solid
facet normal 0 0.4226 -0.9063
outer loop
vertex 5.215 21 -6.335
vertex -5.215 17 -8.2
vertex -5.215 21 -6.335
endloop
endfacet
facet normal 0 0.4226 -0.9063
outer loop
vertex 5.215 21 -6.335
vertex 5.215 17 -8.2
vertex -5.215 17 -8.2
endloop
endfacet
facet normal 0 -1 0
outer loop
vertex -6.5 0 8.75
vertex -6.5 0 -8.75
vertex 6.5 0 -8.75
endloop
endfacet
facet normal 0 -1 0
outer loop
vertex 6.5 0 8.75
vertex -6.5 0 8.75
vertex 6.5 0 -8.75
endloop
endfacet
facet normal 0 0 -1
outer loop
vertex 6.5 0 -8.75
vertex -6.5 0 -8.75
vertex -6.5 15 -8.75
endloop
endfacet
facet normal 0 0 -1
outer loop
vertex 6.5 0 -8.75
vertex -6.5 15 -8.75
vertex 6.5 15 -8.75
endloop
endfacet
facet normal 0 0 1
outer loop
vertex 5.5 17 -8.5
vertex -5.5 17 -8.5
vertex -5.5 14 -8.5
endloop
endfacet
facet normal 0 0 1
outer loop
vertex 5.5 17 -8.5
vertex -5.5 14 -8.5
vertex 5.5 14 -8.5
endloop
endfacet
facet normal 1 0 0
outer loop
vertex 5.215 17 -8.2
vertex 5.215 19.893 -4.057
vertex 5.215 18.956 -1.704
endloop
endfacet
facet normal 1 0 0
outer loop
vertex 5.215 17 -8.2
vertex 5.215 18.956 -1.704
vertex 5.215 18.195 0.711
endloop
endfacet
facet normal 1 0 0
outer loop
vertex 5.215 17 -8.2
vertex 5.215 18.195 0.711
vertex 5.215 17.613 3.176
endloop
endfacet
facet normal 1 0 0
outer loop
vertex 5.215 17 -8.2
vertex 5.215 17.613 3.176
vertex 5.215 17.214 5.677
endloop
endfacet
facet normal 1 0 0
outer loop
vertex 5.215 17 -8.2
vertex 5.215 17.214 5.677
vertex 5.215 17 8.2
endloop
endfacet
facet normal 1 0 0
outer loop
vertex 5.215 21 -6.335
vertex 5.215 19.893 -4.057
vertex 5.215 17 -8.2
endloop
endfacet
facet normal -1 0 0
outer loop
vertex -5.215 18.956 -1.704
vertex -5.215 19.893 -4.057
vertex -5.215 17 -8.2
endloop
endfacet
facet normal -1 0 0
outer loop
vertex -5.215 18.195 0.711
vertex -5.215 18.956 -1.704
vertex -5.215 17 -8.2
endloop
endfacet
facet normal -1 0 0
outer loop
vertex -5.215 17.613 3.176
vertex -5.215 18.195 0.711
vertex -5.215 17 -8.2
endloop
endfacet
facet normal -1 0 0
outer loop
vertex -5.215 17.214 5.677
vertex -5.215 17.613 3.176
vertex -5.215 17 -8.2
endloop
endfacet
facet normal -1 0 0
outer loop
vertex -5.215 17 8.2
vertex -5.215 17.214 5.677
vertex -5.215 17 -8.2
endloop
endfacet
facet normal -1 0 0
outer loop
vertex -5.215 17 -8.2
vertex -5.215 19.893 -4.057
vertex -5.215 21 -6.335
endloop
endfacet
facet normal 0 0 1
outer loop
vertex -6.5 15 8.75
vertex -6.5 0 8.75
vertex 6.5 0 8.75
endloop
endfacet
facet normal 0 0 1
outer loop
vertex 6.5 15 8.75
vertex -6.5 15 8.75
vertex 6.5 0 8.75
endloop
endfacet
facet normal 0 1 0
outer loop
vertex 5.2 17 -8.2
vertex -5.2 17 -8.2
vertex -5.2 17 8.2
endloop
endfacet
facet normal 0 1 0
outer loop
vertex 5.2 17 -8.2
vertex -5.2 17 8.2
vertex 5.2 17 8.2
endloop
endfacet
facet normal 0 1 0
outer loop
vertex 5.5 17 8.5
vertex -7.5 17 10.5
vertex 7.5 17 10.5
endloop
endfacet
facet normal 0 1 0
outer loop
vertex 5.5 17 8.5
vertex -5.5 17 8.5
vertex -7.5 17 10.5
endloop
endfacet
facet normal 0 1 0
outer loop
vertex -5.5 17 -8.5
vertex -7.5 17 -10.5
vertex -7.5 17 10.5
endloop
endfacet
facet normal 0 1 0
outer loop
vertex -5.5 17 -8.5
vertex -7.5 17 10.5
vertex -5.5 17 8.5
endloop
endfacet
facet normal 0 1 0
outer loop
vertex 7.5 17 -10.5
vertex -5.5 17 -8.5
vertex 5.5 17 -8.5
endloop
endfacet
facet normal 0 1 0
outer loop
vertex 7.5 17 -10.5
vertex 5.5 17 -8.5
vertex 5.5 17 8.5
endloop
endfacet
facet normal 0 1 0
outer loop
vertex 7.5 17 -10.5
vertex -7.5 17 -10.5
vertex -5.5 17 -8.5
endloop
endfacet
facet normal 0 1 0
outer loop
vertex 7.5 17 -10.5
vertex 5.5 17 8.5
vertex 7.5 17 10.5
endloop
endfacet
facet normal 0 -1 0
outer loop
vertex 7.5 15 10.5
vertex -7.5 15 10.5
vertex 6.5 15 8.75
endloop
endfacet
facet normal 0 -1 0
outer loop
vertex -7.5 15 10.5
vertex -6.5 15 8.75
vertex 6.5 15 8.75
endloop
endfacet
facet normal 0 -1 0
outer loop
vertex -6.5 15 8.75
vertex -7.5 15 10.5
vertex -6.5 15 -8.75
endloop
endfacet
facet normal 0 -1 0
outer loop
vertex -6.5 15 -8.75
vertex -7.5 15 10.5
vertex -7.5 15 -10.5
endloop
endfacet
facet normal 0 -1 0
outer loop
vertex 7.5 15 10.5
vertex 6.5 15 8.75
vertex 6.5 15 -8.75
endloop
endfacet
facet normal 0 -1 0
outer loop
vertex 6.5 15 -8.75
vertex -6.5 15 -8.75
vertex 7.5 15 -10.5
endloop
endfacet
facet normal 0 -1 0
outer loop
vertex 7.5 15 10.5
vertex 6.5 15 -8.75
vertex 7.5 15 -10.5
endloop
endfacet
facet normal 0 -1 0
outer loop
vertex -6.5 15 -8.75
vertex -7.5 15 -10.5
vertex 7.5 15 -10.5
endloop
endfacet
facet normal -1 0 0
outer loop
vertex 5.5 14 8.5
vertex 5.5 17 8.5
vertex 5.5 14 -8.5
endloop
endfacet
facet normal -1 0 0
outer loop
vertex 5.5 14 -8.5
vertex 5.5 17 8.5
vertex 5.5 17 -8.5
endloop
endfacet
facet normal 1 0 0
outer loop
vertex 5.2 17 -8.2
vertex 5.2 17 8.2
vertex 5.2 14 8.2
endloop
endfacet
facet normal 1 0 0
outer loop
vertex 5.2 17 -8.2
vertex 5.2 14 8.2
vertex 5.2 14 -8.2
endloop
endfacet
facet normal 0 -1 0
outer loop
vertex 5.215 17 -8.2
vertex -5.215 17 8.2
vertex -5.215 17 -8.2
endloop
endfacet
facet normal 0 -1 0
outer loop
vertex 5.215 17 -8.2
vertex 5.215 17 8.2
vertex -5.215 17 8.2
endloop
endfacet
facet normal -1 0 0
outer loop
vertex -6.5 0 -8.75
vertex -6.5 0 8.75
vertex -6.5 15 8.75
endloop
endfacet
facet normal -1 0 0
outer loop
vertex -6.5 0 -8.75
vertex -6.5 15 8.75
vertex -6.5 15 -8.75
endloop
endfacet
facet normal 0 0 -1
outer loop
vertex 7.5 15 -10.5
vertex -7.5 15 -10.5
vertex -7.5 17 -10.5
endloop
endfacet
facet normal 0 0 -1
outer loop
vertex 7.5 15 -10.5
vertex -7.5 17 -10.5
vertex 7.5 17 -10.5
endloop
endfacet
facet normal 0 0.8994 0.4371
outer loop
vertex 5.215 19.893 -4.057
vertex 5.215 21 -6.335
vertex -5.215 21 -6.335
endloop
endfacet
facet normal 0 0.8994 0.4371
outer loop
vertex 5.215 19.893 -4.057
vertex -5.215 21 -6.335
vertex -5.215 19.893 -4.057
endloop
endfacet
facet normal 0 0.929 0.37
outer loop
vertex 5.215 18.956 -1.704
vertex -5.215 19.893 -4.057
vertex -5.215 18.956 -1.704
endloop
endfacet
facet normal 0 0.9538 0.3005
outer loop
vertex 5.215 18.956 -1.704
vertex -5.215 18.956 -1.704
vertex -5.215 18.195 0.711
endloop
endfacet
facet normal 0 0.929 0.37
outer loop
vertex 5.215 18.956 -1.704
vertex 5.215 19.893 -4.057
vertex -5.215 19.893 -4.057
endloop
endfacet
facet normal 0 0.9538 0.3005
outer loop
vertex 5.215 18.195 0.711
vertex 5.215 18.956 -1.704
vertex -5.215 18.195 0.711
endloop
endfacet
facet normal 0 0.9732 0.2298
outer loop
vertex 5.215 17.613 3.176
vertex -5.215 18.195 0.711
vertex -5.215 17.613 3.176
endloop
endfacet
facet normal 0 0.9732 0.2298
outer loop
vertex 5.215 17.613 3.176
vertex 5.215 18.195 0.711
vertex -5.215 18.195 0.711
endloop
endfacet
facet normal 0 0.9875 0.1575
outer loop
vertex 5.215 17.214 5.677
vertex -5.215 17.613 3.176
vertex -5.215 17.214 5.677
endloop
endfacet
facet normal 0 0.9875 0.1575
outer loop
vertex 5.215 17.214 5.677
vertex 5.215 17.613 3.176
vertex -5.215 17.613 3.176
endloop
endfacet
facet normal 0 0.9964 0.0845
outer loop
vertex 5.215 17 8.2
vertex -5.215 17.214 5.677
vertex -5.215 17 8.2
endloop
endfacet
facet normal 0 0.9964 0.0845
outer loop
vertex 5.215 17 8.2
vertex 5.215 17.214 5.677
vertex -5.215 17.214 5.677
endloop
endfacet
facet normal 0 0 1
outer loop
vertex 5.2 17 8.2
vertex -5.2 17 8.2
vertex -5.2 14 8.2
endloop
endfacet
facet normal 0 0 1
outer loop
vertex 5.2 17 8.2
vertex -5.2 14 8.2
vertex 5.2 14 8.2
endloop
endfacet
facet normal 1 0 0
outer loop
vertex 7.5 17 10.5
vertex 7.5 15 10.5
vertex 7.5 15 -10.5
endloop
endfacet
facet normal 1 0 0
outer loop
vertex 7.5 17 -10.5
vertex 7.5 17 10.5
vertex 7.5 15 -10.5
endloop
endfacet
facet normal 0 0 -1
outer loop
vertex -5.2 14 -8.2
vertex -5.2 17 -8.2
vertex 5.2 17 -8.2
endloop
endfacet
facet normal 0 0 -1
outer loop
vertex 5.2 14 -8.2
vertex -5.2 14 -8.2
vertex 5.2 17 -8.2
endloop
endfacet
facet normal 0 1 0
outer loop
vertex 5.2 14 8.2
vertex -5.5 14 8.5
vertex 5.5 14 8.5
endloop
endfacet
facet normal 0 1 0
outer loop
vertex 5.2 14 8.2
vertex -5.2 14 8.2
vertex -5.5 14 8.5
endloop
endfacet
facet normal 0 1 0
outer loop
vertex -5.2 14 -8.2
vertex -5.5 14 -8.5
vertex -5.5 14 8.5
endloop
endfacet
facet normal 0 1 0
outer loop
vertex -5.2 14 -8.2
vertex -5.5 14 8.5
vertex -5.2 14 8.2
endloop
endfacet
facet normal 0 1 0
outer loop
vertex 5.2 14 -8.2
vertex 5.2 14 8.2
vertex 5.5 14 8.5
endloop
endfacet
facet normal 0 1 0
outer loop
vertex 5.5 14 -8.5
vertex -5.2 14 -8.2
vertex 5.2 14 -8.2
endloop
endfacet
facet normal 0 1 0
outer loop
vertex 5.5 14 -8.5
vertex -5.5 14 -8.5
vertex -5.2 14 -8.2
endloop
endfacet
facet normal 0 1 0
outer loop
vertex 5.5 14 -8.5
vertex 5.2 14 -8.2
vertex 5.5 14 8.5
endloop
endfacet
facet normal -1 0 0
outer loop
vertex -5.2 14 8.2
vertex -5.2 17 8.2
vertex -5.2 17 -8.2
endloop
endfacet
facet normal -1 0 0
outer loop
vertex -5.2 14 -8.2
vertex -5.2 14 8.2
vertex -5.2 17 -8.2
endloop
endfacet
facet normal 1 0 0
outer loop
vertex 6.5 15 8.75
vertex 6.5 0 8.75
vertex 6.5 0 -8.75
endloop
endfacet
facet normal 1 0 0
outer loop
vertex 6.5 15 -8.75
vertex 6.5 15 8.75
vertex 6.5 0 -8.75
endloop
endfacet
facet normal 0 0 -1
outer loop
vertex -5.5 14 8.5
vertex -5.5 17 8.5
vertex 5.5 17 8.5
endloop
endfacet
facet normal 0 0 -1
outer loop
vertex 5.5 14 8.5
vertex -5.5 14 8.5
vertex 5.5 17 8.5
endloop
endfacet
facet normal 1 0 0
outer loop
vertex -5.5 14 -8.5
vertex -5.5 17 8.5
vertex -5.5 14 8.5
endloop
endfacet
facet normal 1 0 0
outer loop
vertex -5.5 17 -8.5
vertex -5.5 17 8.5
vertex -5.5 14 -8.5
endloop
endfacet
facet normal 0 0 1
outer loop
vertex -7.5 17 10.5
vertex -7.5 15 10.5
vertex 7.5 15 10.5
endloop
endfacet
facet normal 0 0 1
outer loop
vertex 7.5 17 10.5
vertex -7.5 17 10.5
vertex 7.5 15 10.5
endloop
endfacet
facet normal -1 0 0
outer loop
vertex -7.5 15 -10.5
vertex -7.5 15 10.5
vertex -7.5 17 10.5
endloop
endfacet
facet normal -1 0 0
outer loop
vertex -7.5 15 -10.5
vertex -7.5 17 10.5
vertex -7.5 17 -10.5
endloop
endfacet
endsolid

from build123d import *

# Parameters (mm, degrees)
SKETCH_1_W          = 13
SKETCH_1_H          = 17.5
EXTRUDE_1_DEPTH     = 15
SKETCH_2_W          = 15
SKETCH_2_H          = 21
EXTRUDE_2_DEPTH     = 2
SKETCH_3_W          = 11
SKETCH_3_H          = 17
SKETCH_3_W_2        = 10.4
SKETCH_3_H_2        = 16.4
CUT_EXTRUDE_1_DEPTH = 3
EXTRUDE_3_DEPTH     = 5.215


with BuildPart() as part:
    # 草图1 → 凸台-拉伸1 (new body)
    with BuildSketch(Plane(origin=(0, 0, 0), x_dir=(1, 0, 0), z_dir=(0, 1, 0))):
        Rectangle(SKETCH_1_W, SKETCH_1_H)
    extrude(amount=EXTRUDE_1_DEPTH)

    # 草图2 → 凸台-拉伸2 (add)
    with BuildSketch(Plane(origin=(0, 15, 0), x_dir=(1, 0, 0), z_dir=(0, 1, 0))):
        Rectangle(SKETCH_2_W, SKETCH_2_H)
    extrude(amount=EXTRUDE_2_DEPTH)

    # 草图3 → 切除-拉伸1 (cut)
    with BuildSketch(Plane(origin=(0, 17, 0), x_dir=(1, 0, 0), z_dir=(0, 1, 0))):
        Rectangle(SKETCH_3_W, SKETCH_3_H)
        Rectangle(SKETCH_3_W_2, SKETCH_3_H_2, mode=Mode.SUBTRACT)
    extrude(amount=-CUT_EXTRUDE_1_DEPTH, mode=Mode.SUBTRACT)


with BuildPart() as body_2:
    # 草图4 → 凸台-拉伸3 (new, symmetric)
    with BuildSketch(Plane(origin=(0, 0, 0), x_dir=(0, 0, -1), z_dir=(1, 0, 0))):
        with BuildLine():
            Line((8.2, 17), (6.334769367, 21))
            ThreePointArc((6.334769367, 21), (-0.710956487, 18.194560008), (-8.2, 17))
            Line((-8.2, 17), (8.2, 17))
        make_face()
    extrude(amount=EXTRUDE_3_DEPTH, both=True)


solid = Compound([part.part, body_2.part])
